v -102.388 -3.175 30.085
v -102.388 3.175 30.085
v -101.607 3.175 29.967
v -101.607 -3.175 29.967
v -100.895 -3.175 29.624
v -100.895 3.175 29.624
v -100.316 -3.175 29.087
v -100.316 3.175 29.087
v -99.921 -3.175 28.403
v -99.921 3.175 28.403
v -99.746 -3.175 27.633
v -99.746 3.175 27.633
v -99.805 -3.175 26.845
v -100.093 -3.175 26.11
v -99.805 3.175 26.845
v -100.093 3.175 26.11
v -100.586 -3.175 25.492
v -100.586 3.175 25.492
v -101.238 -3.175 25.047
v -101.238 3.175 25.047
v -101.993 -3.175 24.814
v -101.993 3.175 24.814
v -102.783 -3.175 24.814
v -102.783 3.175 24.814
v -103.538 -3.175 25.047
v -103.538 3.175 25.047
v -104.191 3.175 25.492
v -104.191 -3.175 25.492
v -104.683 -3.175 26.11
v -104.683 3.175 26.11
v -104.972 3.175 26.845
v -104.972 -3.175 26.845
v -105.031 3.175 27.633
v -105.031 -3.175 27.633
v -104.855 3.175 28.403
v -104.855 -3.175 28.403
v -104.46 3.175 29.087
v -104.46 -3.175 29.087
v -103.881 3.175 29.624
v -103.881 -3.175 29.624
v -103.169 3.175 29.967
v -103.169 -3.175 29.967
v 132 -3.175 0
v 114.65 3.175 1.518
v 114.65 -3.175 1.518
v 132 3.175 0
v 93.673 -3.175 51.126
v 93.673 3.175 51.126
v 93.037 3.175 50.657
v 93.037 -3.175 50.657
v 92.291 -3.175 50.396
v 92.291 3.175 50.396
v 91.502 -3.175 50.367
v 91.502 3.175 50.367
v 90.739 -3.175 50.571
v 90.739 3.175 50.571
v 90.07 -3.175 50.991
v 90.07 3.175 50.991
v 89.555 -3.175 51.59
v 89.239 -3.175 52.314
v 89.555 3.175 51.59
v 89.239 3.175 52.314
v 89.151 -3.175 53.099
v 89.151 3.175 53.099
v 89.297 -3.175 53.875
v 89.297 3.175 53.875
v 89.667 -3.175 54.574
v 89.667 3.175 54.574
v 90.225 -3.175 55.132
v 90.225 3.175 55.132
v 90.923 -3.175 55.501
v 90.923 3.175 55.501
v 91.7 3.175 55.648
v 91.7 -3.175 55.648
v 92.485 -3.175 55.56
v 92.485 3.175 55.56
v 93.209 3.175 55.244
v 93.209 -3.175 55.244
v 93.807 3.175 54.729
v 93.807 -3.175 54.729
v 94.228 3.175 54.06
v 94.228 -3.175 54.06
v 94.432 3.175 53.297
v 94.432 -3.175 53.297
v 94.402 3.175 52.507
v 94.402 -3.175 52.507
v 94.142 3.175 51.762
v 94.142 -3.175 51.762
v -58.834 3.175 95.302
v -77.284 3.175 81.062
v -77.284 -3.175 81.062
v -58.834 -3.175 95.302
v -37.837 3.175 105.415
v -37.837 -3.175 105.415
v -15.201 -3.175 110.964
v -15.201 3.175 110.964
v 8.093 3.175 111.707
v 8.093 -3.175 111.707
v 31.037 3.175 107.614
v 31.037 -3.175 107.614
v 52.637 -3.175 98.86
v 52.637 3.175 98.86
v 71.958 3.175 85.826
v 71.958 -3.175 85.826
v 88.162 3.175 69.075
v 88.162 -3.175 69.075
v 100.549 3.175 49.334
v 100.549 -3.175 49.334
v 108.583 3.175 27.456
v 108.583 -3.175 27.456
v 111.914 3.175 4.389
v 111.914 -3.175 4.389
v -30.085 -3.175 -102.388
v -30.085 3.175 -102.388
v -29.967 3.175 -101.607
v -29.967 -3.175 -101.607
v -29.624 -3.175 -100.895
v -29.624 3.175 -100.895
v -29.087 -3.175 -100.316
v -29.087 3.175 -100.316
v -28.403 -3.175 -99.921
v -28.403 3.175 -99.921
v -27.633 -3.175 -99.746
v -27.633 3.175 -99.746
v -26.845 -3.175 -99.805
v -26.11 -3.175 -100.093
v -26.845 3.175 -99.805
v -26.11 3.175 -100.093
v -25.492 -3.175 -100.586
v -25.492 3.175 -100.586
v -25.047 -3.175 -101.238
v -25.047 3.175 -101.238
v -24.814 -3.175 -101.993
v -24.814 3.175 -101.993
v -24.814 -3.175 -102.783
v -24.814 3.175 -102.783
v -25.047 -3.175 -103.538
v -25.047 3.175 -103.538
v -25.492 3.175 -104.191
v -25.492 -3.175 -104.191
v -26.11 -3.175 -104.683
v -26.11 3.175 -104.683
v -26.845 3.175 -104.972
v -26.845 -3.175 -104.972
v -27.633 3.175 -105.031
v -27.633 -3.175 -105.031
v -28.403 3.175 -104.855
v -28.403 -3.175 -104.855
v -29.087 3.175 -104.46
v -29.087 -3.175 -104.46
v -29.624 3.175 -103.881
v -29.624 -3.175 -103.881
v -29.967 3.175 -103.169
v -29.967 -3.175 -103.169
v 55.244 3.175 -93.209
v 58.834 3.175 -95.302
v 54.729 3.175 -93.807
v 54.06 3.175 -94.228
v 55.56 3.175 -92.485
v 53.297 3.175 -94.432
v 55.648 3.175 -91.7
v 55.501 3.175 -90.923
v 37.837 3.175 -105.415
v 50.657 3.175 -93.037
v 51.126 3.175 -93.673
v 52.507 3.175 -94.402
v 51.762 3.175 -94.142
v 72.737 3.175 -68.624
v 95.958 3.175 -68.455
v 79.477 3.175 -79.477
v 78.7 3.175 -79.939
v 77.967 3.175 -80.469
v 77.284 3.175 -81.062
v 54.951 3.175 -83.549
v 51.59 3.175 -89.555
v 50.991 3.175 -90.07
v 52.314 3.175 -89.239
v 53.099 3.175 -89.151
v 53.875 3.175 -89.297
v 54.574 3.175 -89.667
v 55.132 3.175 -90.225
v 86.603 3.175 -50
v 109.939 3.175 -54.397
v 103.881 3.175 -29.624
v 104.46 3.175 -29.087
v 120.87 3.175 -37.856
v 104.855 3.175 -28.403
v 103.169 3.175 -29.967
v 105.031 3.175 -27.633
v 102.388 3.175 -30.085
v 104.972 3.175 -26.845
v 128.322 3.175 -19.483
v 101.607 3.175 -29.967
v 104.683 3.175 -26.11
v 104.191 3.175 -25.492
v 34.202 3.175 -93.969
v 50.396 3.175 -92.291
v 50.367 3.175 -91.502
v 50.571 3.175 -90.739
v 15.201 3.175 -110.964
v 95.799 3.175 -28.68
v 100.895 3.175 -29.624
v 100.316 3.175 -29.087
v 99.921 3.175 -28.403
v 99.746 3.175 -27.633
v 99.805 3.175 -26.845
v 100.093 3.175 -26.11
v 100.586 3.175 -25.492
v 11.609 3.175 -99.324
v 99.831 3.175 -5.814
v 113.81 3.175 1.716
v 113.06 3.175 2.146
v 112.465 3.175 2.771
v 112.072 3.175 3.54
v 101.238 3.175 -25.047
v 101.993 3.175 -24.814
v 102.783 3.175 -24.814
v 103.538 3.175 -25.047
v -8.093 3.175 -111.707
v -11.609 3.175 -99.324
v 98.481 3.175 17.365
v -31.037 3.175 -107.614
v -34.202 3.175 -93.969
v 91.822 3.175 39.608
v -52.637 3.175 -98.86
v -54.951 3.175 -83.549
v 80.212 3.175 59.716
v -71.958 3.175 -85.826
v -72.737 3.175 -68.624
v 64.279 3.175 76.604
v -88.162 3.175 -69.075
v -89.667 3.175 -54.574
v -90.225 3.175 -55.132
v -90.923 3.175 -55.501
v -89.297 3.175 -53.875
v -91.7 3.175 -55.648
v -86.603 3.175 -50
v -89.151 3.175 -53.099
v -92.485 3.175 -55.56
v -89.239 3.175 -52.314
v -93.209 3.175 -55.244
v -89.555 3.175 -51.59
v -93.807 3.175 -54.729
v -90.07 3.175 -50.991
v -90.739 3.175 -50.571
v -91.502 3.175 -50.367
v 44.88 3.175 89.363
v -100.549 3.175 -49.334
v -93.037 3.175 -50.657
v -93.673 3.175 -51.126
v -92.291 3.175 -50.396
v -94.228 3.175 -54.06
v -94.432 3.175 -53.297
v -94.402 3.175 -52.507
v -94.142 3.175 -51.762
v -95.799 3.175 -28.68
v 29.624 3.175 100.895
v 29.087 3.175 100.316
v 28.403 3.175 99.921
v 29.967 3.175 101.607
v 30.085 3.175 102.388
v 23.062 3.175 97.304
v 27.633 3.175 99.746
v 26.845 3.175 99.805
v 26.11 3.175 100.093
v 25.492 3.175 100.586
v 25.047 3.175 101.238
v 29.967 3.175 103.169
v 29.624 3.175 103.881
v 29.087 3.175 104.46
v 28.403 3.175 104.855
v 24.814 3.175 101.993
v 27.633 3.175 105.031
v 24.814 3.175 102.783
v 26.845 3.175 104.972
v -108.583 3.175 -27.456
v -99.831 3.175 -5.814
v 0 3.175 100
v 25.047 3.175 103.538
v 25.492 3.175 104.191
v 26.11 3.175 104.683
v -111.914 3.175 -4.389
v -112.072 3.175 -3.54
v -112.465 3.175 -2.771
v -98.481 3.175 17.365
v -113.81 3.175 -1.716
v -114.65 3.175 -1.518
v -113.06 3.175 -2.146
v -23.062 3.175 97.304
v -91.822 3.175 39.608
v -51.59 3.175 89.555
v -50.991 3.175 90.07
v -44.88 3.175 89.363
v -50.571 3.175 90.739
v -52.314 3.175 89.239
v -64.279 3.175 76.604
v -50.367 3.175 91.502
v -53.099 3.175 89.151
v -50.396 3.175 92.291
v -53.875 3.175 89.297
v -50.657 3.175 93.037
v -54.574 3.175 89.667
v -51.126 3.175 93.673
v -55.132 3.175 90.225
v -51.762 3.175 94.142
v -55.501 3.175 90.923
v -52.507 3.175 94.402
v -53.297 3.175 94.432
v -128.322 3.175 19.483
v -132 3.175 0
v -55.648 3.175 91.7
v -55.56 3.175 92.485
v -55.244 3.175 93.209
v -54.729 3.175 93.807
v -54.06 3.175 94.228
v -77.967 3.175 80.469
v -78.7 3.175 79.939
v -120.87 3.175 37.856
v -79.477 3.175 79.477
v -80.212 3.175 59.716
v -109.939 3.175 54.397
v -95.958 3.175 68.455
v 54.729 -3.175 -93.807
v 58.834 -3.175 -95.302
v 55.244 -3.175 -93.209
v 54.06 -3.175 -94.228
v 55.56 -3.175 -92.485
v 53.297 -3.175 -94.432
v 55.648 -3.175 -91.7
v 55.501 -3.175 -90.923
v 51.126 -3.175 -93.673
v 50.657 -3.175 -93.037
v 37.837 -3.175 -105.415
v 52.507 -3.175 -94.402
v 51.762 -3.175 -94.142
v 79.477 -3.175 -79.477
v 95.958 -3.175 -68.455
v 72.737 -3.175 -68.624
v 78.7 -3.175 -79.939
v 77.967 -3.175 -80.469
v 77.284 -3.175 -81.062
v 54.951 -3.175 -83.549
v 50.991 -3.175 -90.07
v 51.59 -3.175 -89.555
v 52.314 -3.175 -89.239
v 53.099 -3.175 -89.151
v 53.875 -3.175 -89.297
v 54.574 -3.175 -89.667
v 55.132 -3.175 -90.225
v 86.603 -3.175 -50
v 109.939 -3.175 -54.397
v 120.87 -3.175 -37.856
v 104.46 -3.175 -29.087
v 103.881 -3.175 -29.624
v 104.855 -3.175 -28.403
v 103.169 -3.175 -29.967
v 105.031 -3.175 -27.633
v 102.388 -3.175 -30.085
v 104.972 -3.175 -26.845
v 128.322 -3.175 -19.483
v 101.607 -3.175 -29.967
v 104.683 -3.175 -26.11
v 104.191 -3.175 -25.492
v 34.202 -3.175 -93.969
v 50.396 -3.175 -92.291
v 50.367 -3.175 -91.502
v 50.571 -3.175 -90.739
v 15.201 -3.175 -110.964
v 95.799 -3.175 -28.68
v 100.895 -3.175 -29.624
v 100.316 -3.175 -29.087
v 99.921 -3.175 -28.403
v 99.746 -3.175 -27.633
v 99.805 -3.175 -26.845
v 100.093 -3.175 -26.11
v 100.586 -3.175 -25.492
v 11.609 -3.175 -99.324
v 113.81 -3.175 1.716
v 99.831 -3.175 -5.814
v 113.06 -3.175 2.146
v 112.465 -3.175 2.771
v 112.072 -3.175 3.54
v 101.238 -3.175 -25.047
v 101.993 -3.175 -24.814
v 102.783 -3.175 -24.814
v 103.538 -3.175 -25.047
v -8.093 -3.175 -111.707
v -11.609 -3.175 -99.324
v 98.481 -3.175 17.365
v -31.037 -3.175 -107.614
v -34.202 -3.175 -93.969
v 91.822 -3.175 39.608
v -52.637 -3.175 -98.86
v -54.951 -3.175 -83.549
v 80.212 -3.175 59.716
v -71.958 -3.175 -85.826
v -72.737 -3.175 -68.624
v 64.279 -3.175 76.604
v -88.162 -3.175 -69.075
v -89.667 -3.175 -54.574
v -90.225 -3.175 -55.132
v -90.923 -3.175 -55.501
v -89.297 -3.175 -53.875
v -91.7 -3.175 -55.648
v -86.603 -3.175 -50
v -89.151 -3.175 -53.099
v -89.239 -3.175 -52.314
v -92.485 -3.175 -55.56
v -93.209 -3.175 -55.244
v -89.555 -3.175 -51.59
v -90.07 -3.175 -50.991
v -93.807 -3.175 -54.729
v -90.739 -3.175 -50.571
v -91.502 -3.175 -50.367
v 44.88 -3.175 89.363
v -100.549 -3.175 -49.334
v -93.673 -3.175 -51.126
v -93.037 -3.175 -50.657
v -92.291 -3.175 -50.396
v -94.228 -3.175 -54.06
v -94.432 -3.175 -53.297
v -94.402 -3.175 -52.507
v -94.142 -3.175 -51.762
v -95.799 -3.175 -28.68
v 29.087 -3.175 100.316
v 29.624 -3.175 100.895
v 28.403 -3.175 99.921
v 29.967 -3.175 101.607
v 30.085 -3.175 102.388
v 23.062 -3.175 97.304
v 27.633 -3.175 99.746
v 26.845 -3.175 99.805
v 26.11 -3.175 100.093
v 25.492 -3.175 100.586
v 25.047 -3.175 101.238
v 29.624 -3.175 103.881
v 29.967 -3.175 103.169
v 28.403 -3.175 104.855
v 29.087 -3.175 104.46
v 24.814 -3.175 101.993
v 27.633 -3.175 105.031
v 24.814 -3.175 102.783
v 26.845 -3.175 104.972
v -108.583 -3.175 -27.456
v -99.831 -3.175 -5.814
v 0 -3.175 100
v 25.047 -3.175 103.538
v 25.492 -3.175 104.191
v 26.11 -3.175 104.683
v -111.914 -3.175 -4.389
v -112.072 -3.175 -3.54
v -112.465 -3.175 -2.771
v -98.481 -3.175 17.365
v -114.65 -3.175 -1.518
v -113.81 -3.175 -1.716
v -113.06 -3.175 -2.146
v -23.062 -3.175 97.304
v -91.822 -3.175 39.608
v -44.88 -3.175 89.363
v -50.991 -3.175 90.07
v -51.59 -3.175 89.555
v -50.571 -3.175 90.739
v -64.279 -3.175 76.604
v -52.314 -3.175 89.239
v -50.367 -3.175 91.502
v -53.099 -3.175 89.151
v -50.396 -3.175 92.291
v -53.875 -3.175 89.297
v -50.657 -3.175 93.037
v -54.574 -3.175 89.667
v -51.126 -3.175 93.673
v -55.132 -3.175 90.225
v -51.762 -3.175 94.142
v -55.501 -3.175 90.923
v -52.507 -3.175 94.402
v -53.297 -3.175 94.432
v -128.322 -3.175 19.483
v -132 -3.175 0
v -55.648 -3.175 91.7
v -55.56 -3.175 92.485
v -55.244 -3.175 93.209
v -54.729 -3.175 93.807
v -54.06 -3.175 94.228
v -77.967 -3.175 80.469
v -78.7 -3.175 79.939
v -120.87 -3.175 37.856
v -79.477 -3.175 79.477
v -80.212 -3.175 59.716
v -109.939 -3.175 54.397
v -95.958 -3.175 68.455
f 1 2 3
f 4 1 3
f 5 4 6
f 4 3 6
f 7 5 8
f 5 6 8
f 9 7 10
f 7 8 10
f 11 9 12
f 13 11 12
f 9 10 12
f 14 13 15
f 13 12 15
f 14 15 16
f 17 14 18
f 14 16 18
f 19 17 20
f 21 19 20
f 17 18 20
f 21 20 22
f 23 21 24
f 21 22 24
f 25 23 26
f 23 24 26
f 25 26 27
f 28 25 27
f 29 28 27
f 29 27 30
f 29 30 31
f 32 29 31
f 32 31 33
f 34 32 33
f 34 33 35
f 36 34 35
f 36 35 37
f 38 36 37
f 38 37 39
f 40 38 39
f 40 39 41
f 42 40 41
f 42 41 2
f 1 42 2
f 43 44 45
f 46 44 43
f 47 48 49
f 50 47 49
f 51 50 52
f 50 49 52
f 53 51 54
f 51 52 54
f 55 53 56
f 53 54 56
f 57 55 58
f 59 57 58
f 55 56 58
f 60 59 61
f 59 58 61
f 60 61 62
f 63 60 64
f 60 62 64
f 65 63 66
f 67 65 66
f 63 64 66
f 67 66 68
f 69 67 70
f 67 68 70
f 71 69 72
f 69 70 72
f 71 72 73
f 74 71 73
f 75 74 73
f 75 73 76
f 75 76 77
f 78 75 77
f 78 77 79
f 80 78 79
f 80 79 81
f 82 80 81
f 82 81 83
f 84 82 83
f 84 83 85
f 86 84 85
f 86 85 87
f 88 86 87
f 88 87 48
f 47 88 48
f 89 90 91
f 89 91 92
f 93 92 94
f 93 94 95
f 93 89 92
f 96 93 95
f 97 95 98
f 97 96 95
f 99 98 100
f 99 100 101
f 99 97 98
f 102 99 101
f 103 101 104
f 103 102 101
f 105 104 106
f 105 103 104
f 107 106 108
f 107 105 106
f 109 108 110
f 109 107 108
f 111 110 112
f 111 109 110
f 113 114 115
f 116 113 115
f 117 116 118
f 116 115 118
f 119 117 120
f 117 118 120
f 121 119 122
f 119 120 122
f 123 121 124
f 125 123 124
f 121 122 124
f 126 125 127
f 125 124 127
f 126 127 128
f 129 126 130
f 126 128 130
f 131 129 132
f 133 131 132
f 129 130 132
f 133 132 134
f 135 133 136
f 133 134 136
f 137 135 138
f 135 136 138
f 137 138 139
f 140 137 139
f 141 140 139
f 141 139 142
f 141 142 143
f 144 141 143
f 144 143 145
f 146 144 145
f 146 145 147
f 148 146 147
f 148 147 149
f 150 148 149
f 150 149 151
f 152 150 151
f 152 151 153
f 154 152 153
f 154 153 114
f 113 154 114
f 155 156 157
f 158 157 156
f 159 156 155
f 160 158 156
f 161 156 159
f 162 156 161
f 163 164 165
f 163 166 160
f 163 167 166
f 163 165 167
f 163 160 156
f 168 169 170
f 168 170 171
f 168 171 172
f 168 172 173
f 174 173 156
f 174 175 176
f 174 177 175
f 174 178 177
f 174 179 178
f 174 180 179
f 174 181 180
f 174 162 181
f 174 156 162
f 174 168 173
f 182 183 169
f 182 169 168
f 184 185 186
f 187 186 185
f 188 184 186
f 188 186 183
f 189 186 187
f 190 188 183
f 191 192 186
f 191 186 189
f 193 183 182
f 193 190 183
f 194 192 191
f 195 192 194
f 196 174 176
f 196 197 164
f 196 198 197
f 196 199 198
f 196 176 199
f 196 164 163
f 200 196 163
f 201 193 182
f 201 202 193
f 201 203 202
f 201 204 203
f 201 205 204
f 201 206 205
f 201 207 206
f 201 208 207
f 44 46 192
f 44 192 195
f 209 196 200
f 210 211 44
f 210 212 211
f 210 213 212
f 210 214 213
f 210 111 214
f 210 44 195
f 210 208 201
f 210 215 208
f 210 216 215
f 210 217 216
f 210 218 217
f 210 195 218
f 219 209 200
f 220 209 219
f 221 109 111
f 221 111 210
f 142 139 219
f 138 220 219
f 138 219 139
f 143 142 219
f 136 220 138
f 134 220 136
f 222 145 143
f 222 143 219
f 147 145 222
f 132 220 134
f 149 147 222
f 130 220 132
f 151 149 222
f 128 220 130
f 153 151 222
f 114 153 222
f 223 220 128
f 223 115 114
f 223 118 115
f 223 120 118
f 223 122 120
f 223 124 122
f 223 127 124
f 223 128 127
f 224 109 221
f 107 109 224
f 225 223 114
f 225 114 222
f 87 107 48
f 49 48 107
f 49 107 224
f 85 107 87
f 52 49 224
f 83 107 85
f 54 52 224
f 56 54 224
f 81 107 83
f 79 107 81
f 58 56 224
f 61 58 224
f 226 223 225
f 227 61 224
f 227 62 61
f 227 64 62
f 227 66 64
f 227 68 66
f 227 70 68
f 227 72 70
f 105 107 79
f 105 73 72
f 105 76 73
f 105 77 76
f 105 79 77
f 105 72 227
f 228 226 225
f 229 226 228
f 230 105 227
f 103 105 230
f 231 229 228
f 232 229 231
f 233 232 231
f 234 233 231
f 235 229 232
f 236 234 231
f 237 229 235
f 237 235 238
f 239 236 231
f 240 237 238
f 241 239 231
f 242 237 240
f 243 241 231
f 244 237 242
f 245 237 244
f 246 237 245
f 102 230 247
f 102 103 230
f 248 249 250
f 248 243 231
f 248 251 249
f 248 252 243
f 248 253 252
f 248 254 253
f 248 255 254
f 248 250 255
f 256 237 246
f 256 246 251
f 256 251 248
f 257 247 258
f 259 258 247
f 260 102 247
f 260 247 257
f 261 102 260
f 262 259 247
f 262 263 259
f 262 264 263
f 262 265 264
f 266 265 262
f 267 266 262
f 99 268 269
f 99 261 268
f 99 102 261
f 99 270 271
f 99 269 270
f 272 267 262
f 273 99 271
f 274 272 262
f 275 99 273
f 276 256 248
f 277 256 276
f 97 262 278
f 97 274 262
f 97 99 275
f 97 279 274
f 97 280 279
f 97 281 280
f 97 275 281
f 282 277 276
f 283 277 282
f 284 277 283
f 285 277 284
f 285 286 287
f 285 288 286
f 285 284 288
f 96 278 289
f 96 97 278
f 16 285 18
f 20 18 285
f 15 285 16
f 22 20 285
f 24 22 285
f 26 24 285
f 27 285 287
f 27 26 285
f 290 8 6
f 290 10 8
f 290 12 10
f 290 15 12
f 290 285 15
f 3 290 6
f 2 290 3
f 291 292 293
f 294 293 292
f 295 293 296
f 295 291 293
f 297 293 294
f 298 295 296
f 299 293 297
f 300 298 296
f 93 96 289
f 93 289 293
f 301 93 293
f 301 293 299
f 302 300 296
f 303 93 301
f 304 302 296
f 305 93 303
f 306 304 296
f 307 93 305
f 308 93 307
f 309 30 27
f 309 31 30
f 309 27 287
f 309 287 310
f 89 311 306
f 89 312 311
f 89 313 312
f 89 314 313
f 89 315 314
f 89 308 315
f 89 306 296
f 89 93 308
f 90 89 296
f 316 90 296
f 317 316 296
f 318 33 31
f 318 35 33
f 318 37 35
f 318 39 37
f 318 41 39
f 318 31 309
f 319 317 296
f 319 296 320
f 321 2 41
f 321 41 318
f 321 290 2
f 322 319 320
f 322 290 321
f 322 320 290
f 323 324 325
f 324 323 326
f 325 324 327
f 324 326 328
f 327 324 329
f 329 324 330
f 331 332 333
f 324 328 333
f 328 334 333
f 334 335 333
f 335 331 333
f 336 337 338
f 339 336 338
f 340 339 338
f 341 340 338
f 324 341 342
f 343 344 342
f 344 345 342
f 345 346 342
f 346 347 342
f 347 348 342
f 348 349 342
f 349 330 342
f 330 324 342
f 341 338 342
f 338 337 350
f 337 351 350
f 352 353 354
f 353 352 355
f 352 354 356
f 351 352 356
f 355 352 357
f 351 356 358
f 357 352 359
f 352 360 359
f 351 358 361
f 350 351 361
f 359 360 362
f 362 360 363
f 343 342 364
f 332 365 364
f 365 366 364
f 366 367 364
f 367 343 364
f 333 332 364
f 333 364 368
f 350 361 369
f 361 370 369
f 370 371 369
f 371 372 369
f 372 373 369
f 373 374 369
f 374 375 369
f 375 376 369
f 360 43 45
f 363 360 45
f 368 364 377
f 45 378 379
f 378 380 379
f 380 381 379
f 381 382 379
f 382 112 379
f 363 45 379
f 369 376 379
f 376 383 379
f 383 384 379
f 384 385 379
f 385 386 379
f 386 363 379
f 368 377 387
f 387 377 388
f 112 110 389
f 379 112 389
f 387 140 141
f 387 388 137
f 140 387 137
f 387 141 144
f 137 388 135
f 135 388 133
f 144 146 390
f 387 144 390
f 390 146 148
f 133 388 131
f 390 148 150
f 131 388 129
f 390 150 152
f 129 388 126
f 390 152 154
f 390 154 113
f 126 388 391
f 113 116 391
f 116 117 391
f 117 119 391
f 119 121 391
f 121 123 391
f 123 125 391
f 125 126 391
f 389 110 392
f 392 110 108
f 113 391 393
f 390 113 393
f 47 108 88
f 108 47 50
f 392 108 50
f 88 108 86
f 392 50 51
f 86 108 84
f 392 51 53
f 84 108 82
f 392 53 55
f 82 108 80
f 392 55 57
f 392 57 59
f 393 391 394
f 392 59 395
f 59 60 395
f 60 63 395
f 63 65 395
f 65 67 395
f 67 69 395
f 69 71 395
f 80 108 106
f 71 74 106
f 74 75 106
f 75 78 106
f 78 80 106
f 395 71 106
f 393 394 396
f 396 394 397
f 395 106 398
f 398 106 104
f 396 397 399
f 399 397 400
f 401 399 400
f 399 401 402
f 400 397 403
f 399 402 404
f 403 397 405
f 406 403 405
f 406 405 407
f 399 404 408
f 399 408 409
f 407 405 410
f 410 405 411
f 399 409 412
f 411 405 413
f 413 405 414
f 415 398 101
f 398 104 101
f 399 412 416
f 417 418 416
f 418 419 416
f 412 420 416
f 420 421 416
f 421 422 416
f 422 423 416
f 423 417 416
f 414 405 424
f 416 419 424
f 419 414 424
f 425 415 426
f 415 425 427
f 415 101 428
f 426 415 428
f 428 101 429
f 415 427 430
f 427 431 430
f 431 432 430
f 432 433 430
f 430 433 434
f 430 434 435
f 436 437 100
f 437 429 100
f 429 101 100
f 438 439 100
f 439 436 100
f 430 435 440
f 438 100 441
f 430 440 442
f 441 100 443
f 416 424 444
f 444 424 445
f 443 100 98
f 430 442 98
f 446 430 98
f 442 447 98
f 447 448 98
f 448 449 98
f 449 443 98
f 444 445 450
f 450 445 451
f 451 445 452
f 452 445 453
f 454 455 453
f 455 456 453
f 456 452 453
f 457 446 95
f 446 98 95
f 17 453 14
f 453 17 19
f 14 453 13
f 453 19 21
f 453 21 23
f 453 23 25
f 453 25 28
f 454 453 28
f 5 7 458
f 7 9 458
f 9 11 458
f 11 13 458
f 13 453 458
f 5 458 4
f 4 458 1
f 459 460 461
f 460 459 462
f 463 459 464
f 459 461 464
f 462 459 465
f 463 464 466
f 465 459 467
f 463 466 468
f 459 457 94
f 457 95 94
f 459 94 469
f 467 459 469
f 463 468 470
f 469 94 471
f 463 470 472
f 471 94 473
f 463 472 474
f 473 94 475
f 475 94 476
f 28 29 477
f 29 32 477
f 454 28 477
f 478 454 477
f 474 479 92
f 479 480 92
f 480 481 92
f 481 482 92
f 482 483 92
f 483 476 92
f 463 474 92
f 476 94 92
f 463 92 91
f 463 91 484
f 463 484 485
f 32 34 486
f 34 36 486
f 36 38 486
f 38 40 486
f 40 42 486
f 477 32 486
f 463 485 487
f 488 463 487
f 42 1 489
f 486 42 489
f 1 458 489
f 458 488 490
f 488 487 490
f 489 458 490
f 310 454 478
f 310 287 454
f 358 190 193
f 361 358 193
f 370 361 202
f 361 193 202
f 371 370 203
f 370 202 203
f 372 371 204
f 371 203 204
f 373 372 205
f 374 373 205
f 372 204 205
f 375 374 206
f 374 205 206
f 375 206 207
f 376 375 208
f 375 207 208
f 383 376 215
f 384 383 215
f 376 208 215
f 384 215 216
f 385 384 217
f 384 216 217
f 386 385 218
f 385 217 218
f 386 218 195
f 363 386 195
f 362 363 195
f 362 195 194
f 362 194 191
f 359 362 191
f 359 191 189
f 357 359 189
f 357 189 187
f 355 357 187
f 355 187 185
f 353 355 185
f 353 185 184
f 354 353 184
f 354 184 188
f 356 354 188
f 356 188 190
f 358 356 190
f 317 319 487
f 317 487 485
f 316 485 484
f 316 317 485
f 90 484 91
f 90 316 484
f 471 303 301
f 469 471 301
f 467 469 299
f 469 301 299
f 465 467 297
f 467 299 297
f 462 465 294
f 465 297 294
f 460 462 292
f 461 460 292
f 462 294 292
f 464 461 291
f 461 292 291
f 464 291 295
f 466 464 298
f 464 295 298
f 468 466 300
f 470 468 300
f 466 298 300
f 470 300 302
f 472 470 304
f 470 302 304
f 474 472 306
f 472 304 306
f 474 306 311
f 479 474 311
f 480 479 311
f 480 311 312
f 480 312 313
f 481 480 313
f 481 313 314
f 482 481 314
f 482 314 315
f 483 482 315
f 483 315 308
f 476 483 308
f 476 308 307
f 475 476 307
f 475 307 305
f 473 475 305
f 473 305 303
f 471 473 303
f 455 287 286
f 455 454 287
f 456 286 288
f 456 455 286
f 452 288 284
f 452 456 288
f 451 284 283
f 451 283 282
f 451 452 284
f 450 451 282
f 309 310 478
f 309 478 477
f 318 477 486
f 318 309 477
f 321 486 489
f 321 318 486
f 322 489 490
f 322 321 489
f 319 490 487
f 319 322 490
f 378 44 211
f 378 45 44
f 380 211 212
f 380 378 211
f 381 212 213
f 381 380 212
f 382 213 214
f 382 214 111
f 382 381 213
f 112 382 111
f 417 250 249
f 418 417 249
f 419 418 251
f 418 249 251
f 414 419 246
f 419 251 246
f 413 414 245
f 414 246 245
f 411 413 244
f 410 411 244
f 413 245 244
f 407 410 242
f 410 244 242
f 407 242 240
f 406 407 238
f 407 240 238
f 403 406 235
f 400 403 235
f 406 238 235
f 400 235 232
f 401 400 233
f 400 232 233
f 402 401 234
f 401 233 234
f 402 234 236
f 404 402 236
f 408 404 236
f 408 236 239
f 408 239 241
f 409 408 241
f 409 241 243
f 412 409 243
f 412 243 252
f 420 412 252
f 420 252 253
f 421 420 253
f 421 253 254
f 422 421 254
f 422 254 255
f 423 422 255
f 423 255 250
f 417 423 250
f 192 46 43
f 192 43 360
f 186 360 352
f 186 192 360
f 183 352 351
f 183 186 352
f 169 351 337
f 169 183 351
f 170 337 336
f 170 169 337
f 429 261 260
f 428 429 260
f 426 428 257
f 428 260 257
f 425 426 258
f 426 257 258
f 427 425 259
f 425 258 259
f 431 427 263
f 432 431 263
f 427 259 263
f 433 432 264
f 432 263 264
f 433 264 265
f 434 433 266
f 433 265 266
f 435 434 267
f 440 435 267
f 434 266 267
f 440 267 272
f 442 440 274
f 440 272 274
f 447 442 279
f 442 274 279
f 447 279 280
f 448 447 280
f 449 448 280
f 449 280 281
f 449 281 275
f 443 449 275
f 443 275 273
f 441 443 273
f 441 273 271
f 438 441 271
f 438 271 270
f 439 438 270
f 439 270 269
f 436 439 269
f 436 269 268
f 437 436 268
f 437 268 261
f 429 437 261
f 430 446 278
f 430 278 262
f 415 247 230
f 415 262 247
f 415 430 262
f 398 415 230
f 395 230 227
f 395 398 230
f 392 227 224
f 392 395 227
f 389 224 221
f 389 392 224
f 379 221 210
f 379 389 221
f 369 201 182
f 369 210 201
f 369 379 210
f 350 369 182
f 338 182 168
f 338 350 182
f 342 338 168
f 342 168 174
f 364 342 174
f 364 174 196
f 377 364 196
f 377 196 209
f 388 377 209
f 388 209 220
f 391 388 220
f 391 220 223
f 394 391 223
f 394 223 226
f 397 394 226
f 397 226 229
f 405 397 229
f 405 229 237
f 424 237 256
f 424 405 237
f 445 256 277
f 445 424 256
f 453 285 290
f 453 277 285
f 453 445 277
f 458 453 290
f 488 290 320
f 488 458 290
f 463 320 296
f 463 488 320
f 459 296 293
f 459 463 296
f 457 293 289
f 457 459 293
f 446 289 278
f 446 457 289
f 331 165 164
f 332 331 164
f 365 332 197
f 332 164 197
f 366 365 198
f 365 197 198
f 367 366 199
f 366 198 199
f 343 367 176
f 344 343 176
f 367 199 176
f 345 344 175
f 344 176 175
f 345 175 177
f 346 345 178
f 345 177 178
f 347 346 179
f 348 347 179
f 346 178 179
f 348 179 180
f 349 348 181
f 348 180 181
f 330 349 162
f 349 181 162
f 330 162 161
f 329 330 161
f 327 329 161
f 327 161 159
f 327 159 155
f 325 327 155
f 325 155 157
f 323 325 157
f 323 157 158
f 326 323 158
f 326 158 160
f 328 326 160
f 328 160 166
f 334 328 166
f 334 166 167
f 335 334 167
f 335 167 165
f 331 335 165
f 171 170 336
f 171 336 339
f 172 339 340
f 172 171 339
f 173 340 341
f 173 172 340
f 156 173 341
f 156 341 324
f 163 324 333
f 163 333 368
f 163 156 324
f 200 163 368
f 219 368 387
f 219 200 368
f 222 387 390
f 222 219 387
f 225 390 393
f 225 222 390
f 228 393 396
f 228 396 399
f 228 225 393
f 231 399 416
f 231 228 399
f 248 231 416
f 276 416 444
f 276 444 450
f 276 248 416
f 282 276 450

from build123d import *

# Parameters (mm, degrees)
SKETCH1_R                = 100
BOSS_EXTRUDE1_DEPTH      = 3.175
FILLET1_R                = 3
CIRPATTERN1_COUNT        = 2
FILLET1_OF_CIRPATTERN1_R = 3
SKETCH2_R                = 2.65
CUT_EXTRUDE1_DEPTH       = 174.229104079
CIRPATTERN2_COUNT        = 8


with BuildPart() as part:
    # Sketch1 → Boss-Extrude1 (new, symmetric)
    with BuildSketch(Plane(origin=(0, 0, 0), x_dir=(1, 0, 0), z_dir=(0, 1, 0))):
        with BuildLine():
            Line((-111.986312116, 1.750970805), (-132, 0))
            ThreePointArc((-132, 0), (-115.815804966, -46.398149165), (-79.477414809, -79.477414809))
            ThreePointArc((-79.477414809, -79.477414809), (-78.32708198, -80.19539315), (-77.284459499, -81.062397694))
            ThreePointArc((-77.284459499, -81.062397694), (103.297481806, 43.285450818), (-111.986312116, 1.750970805))
        make_face()
        with Locations(Location((0, 0, 0), (0, 0, 270))):
            Circle(SKETCH1_R, mode=Mode.SUBTRACT)
    boss_extrude1 = extrude(amount=BOSS_EXTRUDE1_DEPTH, both=True)

    # Fillet1
    fillet1_edges = [part.edges().sort_by_distance(p)[0] for p in [
        (-111.986312116, 0, -1.750970805),
    ]]
    fillet(fillet1_edges, radius=FILLET1_R)

    # CirPattern1: Boss-Extrude1 ×2 about axis
    cirpattern1_axis = Axis((0, 0, 0), (0, 1, 0))
    for i in range(1, CIRPATTERN1_COUNT):
        add(boss_extrude1.rotate(cirpattern1_axis, i * 360 / CIRPATTERN1_COUNT))

    # Fillet1 of CirPattern1
    fillet1_of_cirpattern1_edges = [part.edges().sort_by_distance(p)[0] for p in [
        (111.986312116, 0, 1.750970805),
    ]]
    fillet(fillet1_of_cirpattern1_edges, radius=FILLET1_OF_CIRPATTERN1_R)

    # Sketch2 → Cut-Extrude1 (cut, through all)
    with BuildSketch(Plane(origin=(0, 3.175, 0), x_dir=(1, 0, 0), z_dir=(0, 1, 0))):
        with Locations(Location((-102.388137587, -27.434818781, 0), (0, 0, 270))):
            Circle(SKETCH2_R)
    cut_extrude1 = extrude(amount=-CUT_EXTRUDE1_DEPTH, mode=Mode.SUBTRACT)

    # CirPattern2: Cut-Extrude1 ×8 about axis
    cirpattern2_axis = Axis((0, 0, 0), (0, 1, 0))
    for i in range(1, CIRPATTERN2_COUNT):
        add(cut_extrude1.rotate(cirpattern2_axis, i * 360 / CIRPATTERN2_COUNT), mode=Mode.SUBTRACT)


solid = part.part
